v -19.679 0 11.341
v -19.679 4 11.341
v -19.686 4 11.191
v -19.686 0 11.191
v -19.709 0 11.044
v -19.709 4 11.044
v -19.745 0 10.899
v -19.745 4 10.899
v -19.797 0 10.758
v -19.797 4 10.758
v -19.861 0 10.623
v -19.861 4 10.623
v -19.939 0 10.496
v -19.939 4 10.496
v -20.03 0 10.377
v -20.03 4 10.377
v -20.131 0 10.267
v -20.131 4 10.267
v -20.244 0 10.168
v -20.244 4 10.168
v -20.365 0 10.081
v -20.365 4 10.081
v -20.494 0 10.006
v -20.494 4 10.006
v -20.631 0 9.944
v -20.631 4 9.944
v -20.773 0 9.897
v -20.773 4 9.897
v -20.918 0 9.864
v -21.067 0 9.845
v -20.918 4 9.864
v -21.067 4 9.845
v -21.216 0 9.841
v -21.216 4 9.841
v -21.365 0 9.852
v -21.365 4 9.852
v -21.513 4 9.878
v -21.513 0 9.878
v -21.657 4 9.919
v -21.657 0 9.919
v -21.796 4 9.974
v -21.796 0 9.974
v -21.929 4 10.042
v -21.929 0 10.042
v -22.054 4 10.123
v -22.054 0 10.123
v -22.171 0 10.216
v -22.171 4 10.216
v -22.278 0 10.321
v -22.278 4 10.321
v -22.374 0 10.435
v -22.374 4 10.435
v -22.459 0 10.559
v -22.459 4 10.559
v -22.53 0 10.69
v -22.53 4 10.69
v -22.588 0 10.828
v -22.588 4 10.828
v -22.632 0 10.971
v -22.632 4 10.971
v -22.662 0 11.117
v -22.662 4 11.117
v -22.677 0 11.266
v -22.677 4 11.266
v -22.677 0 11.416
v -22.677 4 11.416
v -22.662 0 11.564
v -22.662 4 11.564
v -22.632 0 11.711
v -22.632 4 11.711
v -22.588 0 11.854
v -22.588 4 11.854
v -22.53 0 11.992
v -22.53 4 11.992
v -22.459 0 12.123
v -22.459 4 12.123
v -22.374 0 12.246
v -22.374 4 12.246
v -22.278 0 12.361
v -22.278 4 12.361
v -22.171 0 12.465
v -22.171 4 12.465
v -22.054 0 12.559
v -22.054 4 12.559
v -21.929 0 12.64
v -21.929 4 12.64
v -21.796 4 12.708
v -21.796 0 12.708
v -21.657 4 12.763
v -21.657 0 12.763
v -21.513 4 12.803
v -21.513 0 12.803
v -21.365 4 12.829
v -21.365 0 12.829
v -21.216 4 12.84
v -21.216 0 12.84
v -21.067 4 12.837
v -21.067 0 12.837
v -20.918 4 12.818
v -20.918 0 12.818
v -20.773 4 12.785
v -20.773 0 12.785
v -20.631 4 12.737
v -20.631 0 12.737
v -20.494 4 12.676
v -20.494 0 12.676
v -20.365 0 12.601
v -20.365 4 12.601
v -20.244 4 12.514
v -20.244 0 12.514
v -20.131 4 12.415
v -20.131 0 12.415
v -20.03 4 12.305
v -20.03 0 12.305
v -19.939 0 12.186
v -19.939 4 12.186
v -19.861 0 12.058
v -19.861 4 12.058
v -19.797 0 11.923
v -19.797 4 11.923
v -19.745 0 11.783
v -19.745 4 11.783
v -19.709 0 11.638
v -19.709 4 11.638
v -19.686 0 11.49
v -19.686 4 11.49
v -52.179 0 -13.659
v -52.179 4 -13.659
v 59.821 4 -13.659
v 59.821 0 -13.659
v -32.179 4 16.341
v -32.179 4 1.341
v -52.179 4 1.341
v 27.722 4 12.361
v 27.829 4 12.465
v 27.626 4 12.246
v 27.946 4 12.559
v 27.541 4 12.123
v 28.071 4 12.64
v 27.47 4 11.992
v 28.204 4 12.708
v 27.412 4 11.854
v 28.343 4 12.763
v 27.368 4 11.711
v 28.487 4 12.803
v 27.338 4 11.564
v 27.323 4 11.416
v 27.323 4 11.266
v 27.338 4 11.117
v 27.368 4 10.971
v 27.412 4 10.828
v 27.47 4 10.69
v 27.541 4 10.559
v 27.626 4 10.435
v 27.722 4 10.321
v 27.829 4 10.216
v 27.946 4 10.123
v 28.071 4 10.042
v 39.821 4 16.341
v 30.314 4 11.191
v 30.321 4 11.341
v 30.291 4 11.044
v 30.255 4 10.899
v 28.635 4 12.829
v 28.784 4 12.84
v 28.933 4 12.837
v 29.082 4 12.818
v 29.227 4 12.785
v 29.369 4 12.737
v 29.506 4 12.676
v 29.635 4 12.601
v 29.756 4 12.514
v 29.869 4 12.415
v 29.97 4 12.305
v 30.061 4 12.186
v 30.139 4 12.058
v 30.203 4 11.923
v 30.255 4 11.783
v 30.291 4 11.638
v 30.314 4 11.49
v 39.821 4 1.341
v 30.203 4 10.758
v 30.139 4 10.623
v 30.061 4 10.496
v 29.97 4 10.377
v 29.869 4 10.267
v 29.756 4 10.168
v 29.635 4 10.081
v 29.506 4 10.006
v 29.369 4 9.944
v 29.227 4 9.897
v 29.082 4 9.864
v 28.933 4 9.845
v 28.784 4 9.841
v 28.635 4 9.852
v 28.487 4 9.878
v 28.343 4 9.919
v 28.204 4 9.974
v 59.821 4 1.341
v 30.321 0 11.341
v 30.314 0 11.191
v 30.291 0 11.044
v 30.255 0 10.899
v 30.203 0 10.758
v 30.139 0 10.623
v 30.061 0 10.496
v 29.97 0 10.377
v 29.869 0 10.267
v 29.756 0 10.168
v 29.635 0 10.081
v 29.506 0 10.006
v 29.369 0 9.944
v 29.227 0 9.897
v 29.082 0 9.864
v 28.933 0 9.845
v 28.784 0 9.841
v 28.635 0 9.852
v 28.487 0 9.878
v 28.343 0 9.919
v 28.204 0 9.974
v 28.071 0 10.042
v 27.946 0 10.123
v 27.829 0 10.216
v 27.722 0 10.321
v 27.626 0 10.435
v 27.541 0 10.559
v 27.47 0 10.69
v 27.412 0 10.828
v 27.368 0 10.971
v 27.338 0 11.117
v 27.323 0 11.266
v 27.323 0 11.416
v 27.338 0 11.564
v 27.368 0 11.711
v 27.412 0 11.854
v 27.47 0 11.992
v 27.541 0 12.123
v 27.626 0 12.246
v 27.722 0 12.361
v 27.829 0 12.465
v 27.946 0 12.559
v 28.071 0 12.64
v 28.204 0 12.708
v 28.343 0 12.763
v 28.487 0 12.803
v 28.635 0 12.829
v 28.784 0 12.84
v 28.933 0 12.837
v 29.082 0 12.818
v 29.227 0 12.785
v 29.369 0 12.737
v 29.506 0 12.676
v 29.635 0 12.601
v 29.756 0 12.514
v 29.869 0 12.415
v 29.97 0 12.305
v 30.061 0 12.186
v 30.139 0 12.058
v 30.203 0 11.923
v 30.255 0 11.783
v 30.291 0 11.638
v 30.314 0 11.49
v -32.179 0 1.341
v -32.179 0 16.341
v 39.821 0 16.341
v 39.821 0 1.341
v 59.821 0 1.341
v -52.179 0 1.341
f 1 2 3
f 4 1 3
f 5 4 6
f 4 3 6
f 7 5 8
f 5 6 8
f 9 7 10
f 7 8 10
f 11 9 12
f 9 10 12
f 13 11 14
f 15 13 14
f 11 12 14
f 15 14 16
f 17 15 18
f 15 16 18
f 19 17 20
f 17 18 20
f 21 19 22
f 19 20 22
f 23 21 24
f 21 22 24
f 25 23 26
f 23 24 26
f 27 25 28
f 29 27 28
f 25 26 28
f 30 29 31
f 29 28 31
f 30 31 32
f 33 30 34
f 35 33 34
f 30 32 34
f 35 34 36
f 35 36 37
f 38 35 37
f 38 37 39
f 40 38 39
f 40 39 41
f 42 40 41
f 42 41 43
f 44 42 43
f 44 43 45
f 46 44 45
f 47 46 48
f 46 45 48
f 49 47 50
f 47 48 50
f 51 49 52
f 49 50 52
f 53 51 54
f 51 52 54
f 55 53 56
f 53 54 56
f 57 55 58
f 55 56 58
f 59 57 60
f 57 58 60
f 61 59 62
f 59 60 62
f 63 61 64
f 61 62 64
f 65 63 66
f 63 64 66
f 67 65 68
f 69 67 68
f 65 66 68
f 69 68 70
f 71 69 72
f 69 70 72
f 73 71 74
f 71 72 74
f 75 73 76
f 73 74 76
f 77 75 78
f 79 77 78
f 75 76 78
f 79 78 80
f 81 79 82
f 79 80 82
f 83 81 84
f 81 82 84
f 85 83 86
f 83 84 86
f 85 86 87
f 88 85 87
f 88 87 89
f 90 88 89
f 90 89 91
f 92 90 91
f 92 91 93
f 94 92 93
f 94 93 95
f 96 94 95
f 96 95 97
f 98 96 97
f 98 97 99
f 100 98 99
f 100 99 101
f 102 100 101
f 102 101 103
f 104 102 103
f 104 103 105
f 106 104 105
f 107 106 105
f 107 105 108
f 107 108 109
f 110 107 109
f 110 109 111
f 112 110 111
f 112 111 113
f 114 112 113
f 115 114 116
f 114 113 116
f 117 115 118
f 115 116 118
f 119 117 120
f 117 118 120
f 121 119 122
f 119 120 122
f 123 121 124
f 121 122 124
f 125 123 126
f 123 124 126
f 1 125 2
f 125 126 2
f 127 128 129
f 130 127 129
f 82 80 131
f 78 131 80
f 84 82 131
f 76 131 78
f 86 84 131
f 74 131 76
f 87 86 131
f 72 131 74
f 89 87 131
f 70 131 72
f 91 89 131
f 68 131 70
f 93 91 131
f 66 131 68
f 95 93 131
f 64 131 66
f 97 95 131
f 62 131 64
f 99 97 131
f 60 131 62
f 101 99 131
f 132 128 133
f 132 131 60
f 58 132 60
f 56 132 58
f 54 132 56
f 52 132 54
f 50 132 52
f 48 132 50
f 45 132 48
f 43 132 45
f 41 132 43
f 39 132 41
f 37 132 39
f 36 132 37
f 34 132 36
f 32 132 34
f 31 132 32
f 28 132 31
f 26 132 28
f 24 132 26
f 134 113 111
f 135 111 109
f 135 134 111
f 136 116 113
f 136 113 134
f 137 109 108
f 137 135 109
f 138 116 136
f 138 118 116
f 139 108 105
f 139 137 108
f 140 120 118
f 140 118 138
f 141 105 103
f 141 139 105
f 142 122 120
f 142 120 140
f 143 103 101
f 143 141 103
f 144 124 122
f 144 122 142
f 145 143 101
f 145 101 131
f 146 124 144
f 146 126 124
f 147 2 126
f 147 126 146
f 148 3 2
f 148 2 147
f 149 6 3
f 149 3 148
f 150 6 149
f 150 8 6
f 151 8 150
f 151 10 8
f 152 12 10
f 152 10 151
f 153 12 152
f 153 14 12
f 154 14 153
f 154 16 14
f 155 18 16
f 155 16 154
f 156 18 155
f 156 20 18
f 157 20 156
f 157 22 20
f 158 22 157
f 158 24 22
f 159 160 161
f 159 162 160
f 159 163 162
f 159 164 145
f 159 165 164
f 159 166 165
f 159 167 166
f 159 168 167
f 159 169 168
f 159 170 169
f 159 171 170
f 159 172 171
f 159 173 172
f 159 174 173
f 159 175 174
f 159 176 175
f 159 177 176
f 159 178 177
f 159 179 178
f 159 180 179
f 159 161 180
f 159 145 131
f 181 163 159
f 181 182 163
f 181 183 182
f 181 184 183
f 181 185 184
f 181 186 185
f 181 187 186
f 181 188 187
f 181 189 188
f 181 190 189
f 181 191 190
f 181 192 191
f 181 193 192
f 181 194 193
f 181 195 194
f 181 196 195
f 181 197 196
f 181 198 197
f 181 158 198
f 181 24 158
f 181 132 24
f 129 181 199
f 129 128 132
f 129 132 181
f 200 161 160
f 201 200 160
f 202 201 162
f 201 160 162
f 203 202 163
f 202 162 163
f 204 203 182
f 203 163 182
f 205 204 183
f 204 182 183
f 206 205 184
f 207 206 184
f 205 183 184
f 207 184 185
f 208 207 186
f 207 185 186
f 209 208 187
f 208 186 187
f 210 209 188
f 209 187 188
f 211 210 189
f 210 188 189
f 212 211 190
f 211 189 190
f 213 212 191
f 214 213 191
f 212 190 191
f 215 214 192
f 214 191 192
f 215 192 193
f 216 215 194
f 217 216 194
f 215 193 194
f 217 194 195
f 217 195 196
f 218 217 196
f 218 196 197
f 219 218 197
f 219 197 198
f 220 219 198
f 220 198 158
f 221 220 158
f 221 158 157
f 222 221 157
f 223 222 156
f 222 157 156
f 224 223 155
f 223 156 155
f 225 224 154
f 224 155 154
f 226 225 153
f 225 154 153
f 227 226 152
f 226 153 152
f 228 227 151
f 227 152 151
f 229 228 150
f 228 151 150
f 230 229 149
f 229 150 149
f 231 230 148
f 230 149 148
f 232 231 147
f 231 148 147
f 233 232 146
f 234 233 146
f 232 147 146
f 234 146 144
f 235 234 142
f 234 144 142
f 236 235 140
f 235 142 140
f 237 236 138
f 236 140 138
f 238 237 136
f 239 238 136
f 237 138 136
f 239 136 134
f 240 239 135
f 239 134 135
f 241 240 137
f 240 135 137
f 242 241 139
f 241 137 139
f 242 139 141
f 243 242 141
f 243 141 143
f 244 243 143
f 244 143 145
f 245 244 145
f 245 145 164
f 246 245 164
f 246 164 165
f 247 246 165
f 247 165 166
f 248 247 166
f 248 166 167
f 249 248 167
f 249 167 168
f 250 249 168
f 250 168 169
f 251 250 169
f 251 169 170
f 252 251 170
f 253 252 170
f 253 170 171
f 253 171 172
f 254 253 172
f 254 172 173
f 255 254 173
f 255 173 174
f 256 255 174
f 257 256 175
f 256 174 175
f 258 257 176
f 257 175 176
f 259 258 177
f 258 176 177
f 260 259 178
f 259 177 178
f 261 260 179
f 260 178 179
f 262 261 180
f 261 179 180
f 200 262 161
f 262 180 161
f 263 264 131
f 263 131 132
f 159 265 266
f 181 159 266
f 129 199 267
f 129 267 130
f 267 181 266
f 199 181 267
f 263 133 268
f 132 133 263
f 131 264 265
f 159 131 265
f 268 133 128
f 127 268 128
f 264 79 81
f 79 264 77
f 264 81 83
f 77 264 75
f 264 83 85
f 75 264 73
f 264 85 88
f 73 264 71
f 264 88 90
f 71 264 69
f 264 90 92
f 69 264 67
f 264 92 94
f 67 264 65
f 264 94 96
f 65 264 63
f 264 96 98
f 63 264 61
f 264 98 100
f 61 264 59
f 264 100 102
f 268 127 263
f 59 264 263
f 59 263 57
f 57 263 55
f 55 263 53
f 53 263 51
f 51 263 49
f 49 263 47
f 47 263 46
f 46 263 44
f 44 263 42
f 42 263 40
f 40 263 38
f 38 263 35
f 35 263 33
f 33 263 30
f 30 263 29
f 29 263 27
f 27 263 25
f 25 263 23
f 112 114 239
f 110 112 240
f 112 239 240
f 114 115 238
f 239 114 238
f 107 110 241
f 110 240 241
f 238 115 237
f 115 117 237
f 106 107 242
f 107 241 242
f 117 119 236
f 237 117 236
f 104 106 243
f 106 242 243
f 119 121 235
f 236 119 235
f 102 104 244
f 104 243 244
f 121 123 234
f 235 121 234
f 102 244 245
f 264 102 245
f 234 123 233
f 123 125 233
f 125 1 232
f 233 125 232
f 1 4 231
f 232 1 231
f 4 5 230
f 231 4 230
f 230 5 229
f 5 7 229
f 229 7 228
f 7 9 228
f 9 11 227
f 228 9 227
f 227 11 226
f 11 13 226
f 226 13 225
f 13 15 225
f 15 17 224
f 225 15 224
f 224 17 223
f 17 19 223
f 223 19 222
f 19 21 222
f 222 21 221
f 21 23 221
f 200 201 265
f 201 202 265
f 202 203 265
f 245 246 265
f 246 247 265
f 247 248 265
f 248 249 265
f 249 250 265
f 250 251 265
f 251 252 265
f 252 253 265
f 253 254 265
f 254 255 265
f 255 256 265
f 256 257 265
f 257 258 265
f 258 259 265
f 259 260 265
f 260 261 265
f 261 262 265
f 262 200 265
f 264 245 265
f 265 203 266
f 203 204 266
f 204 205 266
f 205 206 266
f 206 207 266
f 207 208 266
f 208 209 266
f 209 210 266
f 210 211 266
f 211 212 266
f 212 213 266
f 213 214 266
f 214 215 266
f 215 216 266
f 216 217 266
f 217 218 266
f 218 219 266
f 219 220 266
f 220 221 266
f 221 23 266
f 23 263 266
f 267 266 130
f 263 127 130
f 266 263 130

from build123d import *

# Parameters (mm, degrees)
SKETCH1_W           = 72
SKETCH1_H           = 30
BOSS_EXTRUDE1_DEPTH = 4
SKETCH2_R           = 1.5
CUT_EXTRUDE1_DEPTH  = 4
SKETCH3_W           = 20
SKETCH3_H           = 15
BOSS_EXTRUDE3_DEPTH = 4


with BuildPart() as part:
    # Sketch1 → Boss-Extrude1 (new body)
    with BuildSketch(Plane(origin=(0, 0, 0), x_dir=(1, 0, 0), z_dir=(0, 1, 0))):
        with Locations((3.82122905, -1.340782123)):
            Rectangle(SKETCH1_W, SKETCH1_H)
    extrude(amount=BOSS_EXTRUDE1_DEPTH)

    # Sketch2 → Cut-Extrude1 (cut)
    with BuildSketch(Plane(origin=(0, 4, 0), x_dir=(1, 0, 0), z_dir=(0, 1, 0))):
        with Locations((-21.17877095, -11.340782123)):
            Circle(SKETCH2_R)
        with Locations((28.82122905, -11.340782123)):
            Circle(SKETCH2_R)
    extrude(amount=-CUT_EXTRUDE1_DEPTH, mode=Mode.SUBTRACT)

    # Sketch3 → Boss-Extrude3 (add)
    with BuildSketch(Plane(origin=(0, 4, 0), x_dir=(1, 0, 0), z_dir=(0, 1, 0))):
        with Locations((49.82122905, 6.159217877)):
            Rectangle(SKETCH3_W, SKETCH3_H)
        with Locations((-42.17877095, 6.159217877)):
            Rectangle(SKETCH3_W, SKETCH3_H)
    extrude(amount=-BOSS_EXTRUDE3_DEPTH)


solid = part.part
